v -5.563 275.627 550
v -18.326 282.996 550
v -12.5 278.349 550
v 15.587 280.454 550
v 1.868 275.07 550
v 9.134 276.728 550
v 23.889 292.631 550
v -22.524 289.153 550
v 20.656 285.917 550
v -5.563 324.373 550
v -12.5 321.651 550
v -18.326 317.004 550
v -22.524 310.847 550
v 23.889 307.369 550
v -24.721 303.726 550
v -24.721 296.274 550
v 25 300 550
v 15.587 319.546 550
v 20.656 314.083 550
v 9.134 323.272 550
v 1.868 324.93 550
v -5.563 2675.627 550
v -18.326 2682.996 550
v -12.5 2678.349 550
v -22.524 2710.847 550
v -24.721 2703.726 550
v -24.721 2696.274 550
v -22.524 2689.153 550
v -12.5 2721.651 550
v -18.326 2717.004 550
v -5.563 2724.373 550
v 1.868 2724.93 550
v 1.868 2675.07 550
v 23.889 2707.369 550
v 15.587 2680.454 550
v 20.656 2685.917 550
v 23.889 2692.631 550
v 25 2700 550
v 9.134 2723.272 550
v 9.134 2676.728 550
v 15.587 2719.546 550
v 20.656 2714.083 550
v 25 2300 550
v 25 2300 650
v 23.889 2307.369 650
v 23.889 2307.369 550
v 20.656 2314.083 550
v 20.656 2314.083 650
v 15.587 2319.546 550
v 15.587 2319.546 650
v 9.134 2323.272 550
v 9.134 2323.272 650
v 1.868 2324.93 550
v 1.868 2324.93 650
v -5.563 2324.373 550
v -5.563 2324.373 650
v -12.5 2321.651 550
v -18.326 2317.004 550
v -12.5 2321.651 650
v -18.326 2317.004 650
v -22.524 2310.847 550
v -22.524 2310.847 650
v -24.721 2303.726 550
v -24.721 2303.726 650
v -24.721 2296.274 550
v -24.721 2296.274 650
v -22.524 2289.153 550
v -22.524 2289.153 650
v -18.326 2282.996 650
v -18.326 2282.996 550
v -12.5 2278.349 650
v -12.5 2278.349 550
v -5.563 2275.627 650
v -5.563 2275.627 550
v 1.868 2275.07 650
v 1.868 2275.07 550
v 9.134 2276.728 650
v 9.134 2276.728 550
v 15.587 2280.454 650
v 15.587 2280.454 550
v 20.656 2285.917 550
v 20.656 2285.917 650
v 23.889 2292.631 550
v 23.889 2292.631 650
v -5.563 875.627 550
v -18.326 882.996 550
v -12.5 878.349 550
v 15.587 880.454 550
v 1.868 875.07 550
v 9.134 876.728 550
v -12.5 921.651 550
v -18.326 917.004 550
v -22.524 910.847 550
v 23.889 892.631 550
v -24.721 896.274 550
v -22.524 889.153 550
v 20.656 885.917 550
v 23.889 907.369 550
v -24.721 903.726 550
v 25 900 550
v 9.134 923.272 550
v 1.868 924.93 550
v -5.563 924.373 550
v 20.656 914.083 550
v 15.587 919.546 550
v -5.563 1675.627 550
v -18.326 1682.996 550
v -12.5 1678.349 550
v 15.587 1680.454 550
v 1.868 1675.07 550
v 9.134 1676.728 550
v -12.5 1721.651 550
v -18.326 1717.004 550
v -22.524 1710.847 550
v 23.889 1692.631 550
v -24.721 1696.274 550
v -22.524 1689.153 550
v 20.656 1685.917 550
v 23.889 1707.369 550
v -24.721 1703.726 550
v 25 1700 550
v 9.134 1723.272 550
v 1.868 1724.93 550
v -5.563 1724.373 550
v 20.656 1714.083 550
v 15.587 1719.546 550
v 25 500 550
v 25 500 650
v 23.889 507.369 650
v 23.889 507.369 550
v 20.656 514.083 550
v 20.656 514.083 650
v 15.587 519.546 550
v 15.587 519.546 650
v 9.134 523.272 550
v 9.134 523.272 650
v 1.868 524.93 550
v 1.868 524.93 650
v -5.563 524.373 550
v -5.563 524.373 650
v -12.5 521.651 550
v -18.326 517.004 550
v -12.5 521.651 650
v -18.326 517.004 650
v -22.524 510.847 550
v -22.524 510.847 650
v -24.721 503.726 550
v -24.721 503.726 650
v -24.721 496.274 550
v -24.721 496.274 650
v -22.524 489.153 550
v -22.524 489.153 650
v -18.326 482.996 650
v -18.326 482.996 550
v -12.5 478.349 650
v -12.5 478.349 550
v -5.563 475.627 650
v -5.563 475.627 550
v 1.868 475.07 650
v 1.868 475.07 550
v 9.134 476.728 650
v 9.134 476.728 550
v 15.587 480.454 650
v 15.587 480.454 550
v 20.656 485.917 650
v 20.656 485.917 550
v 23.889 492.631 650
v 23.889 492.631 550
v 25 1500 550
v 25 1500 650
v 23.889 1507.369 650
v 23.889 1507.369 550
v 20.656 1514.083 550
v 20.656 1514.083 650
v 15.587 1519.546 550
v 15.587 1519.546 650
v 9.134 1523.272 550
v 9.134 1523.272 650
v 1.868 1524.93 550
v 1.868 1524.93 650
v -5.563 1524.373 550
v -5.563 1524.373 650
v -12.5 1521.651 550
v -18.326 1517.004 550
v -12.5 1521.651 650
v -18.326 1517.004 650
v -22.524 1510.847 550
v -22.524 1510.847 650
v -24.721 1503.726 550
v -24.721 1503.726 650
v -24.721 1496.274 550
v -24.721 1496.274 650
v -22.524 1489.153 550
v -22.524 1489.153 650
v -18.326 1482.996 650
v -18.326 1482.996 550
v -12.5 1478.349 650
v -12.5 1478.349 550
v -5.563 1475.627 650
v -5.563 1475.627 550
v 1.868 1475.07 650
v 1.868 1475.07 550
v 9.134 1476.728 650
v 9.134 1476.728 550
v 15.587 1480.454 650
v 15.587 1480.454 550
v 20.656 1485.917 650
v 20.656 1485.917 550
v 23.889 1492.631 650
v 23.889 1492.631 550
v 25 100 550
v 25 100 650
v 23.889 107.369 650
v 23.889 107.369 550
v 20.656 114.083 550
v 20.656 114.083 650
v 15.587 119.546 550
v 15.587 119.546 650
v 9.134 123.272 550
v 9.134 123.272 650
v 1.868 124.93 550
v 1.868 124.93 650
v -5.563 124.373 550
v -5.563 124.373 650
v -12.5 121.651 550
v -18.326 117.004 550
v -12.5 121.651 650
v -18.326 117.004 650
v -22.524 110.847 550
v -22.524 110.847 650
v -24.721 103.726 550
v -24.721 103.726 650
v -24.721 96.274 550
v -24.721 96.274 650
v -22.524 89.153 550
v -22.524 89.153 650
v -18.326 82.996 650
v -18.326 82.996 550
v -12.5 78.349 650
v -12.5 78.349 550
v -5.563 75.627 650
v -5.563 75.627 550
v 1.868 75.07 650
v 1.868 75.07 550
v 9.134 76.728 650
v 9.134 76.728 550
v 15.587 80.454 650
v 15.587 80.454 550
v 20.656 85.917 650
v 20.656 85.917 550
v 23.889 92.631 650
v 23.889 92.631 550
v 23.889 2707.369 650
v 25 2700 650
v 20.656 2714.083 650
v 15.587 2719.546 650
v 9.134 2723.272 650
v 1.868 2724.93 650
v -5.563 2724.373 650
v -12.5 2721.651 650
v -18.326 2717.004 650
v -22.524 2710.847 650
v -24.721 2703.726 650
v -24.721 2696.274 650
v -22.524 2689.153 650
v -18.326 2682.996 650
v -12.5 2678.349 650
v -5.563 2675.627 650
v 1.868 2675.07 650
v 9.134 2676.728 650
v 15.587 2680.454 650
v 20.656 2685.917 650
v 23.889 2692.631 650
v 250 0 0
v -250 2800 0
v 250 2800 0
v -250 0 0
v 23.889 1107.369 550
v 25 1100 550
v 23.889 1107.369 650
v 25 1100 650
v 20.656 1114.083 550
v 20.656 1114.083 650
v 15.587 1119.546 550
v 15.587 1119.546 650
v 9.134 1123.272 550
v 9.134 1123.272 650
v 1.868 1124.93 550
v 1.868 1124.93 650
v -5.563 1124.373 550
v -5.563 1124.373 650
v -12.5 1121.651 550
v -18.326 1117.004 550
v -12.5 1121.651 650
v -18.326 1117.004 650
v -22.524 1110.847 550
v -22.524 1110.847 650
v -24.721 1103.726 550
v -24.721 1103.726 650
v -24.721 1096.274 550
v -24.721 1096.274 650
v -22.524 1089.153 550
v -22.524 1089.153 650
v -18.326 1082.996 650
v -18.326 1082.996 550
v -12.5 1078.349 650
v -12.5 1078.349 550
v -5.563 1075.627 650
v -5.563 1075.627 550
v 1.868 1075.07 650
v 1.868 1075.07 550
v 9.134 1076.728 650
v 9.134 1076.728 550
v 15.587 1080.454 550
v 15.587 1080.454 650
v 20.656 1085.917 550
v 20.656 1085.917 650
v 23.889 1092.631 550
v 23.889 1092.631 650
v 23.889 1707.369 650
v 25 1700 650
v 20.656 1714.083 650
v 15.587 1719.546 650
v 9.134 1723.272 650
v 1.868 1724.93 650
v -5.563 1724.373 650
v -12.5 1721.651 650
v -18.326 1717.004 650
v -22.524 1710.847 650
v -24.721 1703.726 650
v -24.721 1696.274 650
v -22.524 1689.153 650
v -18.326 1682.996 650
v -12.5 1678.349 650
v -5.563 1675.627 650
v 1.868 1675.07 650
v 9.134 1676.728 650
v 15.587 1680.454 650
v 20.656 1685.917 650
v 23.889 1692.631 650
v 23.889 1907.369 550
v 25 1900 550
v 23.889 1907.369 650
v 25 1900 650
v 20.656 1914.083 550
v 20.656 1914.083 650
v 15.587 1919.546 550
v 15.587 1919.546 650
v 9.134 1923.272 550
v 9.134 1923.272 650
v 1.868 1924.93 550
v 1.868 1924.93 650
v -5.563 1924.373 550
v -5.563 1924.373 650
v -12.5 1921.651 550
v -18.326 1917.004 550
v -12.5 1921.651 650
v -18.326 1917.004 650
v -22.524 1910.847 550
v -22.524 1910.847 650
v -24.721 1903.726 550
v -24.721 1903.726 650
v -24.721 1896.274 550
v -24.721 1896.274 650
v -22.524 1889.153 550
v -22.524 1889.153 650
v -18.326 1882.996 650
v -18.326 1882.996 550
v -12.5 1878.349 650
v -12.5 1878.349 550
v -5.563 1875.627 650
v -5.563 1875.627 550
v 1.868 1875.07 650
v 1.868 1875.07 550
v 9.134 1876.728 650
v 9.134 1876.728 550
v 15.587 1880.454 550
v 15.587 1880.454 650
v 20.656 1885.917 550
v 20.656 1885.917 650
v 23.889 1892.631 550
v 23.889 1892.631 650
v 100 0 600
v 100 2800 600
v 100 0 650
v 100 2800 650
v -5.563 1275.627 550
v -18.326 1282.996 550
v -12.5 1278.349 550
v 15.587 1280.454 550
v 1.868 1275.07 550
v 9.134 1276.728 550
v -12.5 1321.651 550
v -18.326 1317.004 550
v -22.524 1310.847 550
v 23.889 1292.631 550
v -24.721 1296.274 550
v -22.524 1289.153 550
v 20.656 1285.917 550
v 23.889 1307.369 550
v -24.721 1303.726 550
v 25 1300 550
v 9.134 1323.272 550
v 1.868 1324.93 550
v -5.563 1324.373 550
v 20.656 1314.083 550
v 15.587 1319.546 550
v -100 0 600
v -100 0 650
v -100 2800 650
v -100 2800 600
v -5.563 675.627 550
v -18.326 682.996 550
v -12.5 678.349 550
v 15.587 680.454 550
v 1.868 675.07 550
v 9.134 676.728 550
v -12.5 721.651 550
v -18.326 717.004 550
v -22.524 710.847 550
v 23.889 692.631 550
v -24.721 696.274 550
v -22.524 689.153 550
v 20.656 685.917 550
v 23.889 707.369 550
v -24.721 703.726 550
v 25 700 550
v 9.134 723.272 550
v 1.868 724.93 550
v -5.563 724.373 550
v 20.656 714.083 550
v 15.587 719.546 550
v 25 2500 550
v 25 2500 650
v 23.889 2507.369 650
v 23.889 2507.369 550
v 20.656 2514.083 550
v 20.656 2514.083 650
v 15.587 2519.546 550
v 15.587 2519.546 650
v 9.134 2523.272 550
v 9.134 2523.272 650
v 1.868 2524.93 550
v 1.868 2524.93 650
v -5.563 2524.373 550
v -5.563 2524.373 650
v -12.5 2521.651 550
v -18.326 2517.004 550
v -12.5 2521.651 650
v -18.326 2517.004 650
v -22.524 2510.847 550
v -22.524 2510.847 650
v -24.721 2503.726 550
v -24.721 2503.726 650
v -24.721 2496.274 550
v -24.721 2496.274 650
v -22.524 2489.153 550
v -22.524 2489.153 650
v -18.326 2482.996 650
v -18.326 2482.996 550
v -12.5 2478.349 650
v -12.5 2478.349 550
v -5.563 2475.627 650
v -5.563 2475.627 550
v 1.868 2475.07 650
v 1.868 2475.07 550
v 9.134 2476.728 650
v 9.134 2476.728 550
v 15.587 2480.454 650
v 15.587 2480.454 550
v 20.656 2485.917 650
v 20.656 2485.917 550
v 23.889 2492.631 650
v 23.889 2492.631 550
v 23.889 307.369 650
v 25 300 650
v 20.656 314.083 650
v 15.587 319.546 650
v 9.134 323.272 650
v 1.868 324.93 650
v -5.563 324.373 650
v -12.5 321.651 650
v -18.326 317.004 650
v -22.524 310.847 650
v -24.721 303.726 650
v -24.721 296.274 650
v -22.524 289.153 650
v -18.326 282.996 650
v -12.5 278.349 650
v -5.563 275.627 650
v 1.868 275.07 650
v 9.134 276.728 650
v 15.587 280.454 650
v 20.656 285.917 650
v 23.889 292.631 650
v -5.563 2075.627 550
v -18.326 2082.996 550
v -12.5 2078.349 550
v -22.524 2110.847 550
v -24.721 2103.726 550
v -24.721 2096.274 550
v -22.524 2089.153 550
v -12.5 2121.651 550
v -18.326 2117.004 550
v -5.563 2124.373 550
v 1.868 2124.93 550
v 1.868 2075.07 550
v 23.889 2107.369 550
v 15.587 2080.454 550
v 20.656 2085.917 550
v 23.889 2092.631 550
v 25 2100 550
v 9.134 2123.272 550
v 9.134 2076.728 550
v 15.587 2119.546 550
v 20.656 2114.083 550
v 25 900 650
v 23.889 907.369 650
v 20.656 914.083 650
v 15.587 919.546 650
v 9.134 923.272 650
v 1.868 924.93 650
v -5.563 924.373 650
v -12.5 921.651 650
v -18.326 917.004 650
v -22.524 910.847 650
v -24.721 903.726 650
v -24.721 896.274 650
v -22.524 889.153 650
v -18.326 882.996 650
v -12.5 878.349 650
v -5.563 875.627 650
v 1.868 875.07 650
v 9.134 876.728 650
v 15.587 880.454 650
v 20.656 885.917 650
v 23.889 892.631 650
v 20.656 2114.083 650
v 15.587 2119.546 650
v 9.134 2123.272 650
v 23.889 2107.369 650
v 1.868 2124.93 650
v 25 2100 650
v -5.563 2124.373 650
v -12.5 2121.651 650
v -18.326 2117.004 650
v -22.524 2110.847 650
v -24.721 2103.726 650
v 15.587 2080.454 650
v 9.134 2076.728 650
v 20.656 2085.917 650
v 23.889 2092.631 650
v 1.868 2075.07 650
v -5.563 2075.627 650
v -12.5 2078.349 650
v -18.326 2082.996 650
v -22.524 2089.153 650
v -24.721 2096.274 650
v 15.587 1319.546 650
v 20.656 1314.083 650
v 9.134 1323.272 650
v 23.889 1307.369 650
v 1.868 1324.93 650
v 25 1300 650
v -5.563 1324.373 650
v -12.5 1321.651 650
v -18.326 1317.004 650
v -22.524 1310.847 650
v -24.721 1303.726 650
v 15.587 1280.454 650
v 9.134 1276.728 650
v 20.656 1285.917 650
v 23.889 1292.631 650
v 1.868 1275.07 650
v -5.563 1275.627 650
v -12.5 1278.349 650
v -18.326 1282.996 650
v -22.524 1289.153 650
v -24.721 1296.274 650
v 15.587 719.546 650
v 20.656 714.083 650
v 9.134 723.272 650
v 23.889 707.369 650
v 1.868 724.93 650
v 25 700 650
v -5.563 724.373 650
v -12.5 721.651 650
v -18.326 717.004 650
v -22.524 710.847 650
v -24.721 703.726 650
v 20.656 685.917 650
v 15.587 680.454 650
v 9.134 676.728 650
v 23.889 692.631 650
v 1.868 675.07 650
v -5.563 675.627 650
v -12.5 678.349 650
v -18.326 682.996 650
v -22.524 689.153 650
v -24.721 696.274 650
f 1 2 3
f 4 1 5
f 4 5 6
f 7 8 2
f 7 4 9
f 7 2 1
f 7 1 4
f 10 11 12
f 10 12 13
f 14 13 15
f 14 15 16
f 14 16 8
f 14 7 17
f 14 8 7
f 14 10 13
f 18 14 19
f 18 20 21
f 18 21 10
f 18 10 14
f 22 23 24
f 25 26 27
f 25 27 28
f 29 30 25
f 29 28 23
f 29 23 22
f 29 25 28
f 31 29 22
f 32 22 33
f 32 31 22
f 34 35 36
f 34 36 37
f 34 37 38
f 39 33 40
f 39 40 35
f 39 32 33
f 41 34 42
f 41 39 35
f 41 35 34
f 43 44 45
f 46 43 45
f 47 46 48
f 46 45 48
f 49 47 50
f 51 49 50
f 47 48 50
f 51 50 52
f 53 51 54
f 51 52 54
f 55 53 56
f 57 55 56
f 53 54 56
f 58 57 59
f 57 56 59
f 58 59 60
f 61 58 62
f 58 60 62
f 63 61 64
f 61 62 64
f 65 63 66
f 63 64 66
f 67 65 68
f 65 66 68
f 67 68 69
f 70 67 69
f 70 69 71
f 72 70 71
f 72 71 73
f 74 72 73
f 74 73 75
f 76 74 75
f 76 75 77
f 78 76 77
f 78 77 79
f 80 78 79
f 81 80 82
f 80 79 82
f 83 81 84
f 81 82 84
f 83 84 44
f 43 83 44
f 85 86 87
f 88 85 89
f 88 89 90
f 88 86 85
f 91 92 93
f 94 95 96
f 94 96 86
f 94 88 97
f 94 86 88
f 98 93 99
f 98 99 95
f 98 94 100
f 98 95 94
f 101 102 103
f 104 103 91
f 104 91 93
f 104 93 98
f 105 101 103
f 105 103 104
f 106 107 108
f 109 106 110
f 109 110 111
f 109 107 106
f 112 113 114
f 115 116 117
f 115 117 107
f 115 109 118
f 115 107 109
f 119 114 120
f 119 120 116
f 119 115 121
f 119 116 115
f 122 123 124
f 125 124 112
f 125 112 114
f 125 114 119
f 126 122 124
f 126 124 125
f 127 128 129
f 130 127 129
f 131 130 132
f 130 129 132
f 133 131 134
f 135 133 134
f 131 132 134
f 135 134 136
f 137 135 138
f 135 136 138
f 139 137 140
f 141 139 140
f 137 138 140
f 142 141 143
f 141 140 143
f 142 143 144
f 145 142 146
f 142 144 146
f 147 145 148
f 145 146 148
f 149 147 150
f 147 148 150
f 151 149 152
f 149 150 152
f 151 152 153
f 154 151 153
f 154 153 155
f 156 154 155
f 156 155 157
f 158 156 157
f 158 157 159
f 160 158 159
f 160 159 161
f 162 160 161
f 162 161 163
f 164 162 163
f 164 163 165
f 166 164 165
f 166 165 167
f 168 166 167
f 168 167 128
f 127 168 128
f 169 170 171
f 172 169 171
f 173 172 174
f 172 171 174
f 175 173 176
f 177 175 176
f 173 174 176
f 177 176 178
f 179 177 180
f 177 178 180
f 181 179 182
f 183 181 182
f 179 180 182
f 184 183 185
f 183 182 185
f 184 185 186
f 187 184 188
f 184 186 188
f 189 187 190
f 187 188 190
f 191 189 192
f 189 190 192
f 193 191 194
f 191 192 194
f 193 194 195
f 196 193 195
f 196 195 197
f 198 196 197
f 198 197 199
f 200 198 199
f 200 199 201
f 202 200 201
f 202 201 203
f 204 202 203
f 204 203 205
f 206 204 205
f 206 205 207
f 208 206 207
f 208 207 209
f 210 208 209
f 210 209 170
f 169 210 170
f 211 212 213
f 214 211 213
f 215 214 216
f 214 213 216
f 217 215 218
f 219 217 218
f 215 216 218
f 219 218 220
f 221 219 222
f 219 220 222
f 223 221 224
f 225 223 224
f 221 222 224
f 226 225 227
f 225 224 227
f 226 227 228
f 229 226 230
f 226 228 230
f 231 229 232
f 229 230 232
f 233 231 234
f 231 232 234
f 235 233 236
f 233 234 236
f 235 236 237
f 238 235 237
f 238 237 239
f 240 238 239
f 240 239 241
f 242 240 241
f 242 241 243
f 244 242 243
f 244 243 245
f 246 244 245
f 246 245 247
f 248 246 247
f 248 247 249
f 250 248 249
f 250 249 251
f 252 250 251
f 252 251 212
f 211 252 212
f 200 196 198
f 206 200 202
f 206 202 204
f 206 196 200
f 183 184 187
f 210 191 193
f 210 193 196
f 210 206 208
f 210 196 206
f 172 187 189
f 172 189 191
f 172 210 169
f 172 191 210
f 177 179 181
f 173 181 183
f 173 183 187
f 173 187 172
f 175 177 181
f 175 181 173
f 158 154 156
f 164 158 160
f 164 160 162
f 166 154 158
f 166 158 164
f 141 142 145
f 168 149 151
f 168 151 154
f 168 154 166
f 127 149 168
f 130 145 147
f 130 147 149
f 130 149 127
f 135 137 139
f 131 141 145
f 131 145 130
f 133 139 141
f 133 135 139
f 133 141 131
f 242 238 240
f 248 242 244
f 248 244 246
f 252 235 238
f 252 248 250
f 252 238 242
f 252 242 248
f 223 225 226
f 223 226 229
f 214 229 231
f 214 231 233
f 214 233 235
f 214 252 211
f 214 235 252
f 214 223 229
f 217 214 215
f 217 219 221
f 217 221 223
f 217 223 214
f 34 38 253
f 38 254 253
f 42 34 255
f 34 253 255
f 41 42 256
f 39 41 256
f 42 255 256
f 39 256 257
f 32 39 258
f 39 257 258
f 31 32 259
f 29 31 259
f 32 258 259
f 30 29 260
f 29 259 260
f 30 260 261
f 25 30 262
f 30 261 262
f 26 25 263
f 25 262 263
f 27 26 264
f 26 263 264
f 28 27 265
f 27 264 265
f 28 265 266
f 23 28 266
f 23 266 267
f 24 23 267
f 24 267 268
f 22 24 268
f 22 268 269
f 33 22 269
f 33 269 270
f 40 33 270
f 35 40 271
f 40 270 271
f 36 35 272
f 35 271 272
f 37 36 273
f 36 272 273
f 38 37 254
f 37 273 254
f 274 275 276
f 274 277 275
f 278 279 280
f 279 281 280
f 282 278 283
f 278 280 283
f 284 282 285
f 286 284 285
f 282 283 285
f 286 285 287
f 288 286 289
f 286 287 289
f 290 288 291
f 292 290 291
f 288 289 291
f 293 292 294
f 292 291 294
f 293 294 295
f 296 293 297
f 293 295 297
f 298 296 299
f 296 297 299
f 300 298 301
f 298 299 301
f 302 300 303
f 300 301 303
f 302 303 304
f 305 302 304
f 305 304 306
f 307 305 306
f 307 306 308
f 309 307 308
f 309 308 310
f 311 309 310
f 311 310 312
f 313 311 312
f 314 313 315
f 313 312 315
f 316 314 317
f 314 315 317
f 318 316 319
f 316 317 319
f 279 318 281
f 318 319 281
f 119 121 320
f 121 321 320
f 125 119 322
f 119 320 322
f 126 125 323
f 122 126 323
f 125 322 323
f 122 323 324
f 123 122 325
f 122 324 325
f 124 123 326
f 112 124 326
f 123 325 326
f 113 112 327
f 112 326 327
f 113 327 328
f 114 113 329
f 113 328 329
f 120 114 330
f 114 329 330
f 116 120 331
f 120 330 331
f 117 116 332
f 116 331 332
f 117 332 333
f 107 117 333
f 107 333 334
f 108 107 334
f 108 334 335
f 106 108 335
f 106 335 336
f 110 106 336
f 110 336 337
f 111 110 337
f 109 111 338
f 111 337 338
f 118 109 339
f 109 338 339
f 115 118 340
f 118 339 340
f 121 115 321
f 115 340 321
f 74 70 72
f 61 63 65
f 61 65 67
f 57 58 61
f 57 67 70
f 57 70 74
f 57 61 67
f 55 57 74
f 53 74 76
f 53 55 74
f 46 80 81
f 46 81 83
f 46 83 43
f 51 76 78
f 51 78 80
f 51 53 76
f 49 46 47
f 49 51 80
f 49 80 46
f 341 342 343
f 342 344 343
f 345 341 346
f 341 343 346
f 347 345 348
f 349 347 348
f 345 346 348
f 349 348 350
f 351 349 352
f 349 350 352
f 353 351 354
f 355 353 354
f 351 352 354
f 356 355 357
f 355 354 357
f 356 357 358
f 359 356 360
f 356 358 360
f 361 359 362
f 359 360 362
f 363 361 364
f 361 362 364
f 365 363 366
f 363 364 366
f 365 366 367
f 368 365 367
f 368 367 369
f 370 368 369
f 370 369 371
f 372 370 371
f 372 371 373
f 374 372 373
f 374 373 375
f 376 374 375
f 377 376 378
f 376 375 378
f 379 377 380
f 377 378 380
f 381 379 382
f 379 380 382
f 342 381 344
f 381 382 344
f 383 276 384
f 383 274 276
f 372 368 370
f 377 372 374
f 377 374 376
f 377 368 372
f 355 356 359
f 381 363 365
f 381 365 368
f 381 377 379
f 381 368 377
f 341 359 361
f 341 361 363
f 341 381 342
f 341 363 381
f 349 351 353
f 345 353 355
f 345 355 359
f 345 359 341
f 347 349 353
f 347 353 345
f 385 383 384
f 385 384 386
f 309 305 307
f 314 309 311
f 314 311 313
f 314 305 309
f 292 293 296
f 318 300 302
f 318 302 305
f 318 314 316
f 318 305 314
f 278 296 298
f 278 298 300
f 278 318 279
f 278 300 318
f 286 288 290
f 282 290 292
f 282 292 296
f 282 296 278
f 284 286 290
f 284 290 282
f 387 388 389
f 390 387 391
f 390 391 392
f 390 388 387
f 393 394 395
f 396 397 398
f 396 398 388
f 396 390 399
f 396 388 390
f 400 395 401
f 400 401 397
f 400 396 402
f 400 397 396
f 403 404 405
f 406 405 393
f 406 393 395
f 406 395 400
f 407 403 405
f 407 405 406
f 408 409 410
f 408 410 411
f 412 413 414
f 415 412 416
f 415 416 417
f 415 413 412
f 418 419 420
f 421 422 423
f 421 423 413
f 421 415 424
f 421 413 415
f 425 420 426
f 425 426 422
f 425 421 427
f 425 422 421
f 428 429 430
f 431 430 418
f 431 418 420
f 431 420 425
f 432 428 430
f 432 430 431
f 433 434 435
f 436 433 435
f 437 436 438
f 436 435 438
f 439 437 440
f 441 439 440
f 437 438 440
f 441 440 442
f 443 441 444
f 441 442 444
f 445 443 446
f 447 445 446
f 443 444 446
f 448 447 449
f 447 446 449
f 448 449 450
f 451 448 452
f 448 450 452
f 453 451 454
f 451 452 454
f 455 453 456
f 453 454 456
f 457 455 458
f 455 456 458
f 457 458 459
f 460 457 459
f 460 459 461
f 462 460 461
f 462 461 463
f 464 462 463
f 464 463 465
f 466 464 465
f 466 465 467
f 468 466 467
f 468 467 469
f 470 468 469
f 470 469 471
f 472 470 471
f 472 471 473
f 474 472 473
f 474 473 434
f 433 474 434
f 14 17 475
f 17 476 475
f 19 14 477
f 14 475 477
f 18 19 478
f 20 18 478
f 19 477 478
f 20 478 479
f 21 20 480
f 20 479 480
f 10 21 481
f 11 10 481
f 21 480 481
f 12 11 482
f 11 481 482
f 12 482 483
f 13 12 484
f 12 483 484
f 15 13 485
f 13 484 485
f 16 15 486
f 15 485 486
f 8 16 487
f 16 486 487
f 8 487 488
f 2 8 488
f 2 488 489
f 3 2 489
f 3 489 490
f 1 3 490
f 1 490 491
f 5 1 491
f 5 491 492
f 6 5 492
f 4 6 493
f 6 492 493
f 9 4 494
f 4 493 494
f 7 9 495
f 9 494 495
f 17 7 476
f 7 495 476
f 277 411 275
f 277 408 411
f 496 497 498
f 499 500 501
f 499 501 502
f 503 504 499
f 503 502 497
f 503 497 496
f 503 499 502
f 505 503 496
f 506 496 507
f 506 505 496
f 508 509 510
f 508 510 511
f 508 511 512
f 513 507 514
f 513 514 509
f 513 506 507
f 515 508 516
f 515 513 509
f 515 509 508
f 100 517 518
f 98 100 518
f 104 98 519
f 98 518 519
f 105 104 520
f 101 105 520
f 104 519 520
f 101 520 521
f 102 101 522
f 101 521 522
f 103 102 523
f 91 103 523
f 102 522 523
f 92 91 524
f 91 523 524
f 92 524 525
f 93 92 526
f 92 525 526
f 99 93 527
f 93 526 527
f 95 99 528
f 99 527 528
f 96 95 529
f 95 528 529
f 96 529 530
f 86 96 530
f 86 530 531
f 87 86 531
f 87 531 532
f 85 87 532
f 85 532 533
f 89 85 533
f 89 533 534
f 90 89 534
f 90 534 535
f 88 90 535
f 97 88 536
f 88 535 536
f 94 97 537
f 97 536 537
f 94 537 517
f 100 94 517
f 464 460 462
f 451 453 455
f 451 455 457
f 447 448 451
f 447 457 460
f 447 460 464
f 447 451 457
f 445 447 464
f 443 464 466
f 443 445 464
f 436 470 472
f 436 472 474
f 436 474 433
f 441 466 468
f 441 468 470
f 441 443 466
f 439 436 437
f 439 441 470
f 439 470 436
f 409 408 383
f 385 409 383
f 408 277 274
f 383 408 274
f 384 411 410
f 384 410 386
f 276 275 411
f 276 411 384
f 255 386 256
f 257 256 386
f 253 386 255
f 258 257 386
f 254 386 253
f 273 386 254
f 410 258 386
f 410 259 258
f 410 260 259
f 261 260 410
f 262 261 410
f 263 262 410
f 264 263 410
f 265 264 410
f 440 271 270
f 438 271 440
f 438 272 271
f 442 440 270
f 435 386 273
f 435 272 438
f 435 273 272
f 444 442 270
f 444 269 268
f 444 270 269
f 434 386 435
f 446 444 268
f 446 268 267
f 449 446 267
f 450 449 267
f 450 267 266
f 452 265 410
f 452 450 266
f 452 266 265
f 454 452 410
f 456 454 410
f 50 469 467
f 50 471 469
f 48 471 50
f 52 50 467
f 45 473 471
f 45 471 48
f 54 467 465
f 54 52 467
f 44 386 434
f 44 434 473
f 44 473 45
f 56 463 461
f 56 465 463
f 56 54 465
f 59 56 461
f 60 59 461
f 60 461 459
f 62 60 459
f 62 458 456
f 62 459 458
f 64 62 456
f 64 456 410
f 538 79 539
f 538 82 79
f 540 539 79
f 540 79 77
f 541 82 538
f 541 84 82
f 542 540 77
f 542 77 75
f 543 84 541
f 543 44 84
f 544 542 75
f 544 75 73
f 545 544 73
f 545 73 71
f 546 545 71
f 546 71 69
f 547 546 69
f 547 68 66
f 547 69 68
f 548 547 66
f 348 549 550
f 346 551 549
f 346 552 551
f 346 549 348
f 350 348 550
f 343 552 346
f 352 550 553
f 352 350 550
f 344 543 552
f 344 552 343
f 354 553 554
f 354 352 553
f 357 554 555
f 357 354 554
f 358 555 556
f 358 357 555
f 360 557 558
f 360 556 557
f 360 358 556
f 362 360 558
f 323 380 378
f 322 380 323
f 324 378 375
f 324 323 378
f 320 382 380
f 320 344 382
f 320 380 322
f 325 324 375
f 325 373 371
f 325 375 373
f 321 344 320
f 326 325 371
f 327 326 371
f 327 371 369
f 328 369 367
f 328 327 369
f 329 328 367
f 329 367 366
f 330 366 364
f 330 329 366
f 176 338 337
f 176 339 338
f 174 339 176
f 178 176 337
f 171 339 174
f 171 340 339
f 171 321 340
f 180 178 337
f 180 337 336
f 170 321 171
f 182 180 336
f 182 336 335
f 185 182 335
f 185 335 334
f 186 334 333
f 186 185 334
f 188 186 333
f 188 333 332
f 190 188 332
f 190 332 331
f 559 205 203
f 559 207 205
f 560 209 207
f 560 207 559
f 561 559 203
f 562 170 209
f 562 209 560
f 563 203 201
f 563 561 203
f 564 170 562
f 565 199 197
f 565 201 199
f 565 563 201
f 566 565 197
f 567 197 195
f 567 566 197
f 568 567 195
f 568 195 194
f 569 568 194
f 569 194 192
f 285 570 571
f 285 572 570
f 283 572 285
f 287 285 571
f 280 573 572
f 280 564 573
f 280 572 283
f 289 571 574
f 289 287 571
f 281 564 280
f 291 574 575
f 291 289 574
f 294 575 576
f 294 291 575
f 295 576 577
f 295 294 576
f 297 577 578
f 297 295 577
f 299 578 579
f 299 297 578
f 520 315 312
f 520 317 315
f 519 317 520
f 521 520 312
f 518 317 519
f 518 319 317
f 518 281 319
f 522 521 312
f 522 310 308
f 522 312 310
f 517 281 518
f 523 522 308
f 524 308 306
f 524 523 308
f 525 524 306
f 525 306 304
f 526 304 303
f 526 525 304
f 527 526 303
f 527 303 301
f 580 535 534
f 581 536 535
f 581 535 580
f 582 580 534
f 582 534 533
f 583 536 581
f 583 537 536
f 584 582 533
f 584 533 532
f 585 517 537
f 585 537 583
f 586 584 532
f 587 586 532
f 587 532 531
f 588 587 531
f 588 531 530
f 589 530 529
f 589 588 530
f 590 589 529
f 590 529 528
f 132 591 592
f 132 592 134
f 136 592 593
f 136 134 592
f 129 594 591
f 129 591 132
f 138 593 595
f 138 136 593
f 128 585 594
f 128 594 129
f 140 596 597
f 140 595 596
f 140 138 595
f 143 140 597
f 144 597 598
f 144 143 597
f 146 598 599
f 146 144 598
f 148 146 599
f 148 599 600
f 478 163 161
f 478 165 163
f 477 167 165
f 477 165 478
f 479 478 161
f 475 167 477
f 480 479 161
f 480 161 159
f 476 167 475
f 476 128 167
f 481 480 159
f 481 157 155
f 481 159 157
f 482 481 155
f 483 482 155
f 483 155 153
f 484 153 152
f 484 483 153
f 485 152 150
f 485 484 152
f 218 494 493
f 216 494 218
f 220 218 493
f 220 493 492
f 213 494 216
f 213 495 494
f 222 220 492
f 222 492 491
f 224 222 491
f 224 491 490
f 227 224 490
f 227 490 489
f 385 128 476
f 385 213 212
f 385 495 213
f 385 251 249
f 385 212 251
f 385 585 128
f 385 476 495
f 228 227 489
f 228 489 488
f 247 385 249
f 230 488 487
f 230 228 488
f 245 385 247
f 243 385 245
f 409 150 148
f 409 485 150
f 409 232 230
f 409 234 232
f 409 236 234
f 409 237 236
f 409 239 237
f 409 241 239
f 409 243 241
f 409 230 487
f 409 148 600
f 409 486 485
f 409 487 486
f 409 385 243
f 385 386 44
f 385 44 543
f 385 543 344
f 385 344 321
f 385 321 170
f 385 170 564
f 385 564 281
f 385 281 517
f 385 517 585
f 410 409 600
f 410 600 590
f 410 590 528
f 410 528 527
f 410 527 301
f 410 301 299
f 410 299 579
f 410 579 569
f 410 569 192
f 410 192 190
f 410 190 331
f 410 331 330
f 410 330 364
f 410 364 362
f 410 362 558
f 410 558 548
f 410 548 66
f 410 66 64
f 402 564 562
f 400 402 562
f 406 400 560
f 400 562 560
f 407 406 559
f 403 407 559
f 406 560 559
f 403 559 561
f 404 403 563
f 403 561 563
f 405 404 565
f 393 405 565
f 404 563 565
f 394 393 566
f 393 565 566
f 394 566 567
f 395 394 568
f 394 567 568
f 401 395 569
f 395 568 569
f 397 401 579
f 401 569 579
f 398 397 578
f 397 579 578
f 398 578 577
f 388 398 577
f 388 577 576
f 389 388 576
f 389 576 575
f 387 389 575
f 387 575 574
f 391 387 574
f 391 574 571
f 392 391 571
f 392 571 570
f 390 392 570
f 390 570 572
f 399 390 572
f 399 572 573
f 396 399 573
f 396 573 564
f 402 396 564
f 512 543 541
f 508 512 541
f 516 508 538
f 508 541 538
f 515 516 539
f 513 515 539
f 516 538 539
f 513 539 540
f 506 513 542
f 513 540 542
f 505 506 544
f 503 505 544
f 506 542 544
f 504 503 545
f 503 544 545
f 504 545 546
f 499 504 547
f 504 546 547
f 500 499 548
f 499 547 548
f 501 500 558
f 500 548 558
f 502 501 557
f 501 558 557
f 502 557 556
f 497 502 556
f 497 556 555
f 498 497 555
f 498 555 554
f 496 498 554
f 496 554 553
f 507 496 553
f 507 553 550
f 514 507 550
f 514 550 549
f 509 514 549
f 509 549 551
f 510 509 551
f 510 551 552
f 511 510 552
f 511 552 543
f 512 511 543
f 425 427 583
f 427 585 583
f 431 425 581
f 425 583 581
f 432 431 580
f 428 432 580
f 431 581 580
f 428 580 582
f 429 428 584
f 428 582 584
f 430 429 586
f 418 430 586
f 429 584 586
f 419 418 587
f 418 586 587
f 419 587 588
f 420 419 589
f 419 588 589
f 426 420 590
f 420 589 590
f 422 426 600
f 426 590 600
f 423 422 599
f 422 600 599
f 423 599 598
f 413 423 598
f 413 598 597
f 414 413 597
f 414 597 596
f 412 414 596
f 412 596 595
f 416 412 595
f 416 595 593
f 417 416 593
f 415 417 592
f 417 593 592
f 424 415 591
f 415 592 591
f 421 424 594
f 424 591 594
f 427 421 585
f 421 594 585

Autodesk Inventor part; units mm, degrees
ref_plane "YZ Plane" through (0, 0, 0) normal (1, 0, 0) x (0, 1, 0)
ref_plane "XZ Plane" through (0, 0, 0) normal (0, 1, 0) x (-1, 0, 0)
ref_plane "XY Plane" through (0, 0, 0) normal (0, 0, 1) x (1, 0, 0)
sketch "Náčrt1" plane through (0, 0, 0) normal (0, 1, 0) x (1, 0, 0)
  line L0 (-250, 0) -> (250, 0)
  line L1 (250, 0) -> (100, -600)
  line L2 (100, -600) -> (100, -650)
  line L3 (100, -650) -> (-100, -650)
  line L4 (-100, -650) -> (-100, -600)
  line L5 (-100, -600) -> (-250, 0)
  point P0 (0, 0)
  point P1 (0, 0)
  point P2 (0, -650)
  dimension "d0" = 500
  dimension "d1" = 50
  dimension "d2" = 600
  dimension "d3" = 200
extrude "Vysunutí1" add sketch "Náčrt1" along normal blind 2800
sketch "Náčrt2" plane through (-100, 0, 650) normal (0, 0, 1) x (1, 0, 0)
  line L0 (200, 0) -> (0, 0) construction
  line L1 (200, 0) -> (200, 2800) construction
  circle A0 centre (100, 100) radius 25
  circle A1 centre (100, 2700) radius 35.9949 construction
  line L2 (100, 100) -> (100, 2700) construction
  point P0 (100, 0)
  point P1 (100, 1400)
  point P2 (200, 1400)
  point P3 (100, 0)
  dimension "d6" = 2600
  dimension "d7" = 50
extrude "Vysunutí2" cut sketch "Náčrt2" against normal blind 100
pattern_linear "Obdélníkové pole1" count 14 spacing 200 along (0, 1, 0) of "Vysunutí2"
properties part number "22002102_Suppot Beam"
